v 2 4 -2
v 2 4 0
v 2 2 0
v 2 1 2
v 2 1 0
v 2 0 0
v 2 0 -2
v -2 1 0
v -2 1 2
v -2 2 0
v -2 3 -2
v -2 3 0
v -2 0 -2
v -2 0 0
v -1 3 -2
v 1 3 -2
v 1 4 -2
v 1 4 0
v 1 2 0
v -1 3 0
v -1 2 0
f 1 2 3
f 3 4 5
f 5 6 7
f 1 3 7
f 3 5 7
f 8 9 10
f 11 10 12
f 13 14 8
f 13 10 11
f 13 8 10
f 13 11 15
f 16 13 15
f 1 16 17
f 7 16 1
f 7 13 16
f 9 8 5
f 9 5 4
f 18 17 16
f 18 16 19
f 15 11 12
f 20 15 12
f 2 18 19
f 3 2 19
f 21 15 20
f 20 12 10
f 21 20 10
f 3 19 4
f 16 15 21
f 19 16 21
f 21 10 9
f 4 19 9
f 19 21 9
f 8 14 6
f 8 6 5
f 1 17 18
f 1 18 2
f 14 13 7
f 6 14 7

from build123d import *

# Parameters (mm, degrees)
SKETCH2_W           = 4
SKETCH2_H           = 4
BOSS_EXTRUDE1_DEPTH = 4
SKETCH3_W           = 2
SKETCH3_H           = 1
CUT_EXTRUDE1_DEPTH  = 14
SKETCH4_W           = 2
SKETCH4_H           = 1
CUT_EXTRUDE2_DEPTH  = 3
CUT_EXTRUDE3_DEPTH  = 2


with BuildPart() as part:
    # Sketch2 → Boss-Extrude1 (new body)
    with BuildSketch(Plane(origin=(0, 0, 0), x_dir=(1, 0, 0), z_dir=(0, 1, 0))):
        Rectangle(SKETCH2_W, SKETCH2_H)
    extrude(amount=BOSS_EXTRUDE1_DEPTH)

    # Sketch3 → Cut-Extrude1 (cut)
    with BuildSketch(Plane.ZY.offset(2)):
        Polygon((0, 4), (0, 2), (2, 1), (2, 2), (2, 4), align=None)
        with Locations((1, 0.5)):
            Rectangle(SKETCH3_W, SKETCH3_H)
    extrude(amount=-CUT_EXTRUDE1_DEPTH, mode=Mode.SUBTRACT)

    # Sketch4 → Cut-Extrude2 (cut)
    with BuildSketch(Plane.ZY.offset(2)):
        with Locations((-1, 3.5)):
            Rectangle(SKETCH4_W, SKETCH4_H)
    extrude(amount=-CUT_EXTRUDE2_DEPTH, mode=Mode.SUBTRACT)

    # Sketch6 → Cut-Extrude3 (cut)
    with BuildSketch(Plane.ZY.offset(-1)):
        Polygon((-2, 3), (0, 2), (0, 3), align=None)
    extrude(amount=CUT_EXTRUDE3_DEPTH, mode=Mode.SUBTRACT)


solid = part.part
